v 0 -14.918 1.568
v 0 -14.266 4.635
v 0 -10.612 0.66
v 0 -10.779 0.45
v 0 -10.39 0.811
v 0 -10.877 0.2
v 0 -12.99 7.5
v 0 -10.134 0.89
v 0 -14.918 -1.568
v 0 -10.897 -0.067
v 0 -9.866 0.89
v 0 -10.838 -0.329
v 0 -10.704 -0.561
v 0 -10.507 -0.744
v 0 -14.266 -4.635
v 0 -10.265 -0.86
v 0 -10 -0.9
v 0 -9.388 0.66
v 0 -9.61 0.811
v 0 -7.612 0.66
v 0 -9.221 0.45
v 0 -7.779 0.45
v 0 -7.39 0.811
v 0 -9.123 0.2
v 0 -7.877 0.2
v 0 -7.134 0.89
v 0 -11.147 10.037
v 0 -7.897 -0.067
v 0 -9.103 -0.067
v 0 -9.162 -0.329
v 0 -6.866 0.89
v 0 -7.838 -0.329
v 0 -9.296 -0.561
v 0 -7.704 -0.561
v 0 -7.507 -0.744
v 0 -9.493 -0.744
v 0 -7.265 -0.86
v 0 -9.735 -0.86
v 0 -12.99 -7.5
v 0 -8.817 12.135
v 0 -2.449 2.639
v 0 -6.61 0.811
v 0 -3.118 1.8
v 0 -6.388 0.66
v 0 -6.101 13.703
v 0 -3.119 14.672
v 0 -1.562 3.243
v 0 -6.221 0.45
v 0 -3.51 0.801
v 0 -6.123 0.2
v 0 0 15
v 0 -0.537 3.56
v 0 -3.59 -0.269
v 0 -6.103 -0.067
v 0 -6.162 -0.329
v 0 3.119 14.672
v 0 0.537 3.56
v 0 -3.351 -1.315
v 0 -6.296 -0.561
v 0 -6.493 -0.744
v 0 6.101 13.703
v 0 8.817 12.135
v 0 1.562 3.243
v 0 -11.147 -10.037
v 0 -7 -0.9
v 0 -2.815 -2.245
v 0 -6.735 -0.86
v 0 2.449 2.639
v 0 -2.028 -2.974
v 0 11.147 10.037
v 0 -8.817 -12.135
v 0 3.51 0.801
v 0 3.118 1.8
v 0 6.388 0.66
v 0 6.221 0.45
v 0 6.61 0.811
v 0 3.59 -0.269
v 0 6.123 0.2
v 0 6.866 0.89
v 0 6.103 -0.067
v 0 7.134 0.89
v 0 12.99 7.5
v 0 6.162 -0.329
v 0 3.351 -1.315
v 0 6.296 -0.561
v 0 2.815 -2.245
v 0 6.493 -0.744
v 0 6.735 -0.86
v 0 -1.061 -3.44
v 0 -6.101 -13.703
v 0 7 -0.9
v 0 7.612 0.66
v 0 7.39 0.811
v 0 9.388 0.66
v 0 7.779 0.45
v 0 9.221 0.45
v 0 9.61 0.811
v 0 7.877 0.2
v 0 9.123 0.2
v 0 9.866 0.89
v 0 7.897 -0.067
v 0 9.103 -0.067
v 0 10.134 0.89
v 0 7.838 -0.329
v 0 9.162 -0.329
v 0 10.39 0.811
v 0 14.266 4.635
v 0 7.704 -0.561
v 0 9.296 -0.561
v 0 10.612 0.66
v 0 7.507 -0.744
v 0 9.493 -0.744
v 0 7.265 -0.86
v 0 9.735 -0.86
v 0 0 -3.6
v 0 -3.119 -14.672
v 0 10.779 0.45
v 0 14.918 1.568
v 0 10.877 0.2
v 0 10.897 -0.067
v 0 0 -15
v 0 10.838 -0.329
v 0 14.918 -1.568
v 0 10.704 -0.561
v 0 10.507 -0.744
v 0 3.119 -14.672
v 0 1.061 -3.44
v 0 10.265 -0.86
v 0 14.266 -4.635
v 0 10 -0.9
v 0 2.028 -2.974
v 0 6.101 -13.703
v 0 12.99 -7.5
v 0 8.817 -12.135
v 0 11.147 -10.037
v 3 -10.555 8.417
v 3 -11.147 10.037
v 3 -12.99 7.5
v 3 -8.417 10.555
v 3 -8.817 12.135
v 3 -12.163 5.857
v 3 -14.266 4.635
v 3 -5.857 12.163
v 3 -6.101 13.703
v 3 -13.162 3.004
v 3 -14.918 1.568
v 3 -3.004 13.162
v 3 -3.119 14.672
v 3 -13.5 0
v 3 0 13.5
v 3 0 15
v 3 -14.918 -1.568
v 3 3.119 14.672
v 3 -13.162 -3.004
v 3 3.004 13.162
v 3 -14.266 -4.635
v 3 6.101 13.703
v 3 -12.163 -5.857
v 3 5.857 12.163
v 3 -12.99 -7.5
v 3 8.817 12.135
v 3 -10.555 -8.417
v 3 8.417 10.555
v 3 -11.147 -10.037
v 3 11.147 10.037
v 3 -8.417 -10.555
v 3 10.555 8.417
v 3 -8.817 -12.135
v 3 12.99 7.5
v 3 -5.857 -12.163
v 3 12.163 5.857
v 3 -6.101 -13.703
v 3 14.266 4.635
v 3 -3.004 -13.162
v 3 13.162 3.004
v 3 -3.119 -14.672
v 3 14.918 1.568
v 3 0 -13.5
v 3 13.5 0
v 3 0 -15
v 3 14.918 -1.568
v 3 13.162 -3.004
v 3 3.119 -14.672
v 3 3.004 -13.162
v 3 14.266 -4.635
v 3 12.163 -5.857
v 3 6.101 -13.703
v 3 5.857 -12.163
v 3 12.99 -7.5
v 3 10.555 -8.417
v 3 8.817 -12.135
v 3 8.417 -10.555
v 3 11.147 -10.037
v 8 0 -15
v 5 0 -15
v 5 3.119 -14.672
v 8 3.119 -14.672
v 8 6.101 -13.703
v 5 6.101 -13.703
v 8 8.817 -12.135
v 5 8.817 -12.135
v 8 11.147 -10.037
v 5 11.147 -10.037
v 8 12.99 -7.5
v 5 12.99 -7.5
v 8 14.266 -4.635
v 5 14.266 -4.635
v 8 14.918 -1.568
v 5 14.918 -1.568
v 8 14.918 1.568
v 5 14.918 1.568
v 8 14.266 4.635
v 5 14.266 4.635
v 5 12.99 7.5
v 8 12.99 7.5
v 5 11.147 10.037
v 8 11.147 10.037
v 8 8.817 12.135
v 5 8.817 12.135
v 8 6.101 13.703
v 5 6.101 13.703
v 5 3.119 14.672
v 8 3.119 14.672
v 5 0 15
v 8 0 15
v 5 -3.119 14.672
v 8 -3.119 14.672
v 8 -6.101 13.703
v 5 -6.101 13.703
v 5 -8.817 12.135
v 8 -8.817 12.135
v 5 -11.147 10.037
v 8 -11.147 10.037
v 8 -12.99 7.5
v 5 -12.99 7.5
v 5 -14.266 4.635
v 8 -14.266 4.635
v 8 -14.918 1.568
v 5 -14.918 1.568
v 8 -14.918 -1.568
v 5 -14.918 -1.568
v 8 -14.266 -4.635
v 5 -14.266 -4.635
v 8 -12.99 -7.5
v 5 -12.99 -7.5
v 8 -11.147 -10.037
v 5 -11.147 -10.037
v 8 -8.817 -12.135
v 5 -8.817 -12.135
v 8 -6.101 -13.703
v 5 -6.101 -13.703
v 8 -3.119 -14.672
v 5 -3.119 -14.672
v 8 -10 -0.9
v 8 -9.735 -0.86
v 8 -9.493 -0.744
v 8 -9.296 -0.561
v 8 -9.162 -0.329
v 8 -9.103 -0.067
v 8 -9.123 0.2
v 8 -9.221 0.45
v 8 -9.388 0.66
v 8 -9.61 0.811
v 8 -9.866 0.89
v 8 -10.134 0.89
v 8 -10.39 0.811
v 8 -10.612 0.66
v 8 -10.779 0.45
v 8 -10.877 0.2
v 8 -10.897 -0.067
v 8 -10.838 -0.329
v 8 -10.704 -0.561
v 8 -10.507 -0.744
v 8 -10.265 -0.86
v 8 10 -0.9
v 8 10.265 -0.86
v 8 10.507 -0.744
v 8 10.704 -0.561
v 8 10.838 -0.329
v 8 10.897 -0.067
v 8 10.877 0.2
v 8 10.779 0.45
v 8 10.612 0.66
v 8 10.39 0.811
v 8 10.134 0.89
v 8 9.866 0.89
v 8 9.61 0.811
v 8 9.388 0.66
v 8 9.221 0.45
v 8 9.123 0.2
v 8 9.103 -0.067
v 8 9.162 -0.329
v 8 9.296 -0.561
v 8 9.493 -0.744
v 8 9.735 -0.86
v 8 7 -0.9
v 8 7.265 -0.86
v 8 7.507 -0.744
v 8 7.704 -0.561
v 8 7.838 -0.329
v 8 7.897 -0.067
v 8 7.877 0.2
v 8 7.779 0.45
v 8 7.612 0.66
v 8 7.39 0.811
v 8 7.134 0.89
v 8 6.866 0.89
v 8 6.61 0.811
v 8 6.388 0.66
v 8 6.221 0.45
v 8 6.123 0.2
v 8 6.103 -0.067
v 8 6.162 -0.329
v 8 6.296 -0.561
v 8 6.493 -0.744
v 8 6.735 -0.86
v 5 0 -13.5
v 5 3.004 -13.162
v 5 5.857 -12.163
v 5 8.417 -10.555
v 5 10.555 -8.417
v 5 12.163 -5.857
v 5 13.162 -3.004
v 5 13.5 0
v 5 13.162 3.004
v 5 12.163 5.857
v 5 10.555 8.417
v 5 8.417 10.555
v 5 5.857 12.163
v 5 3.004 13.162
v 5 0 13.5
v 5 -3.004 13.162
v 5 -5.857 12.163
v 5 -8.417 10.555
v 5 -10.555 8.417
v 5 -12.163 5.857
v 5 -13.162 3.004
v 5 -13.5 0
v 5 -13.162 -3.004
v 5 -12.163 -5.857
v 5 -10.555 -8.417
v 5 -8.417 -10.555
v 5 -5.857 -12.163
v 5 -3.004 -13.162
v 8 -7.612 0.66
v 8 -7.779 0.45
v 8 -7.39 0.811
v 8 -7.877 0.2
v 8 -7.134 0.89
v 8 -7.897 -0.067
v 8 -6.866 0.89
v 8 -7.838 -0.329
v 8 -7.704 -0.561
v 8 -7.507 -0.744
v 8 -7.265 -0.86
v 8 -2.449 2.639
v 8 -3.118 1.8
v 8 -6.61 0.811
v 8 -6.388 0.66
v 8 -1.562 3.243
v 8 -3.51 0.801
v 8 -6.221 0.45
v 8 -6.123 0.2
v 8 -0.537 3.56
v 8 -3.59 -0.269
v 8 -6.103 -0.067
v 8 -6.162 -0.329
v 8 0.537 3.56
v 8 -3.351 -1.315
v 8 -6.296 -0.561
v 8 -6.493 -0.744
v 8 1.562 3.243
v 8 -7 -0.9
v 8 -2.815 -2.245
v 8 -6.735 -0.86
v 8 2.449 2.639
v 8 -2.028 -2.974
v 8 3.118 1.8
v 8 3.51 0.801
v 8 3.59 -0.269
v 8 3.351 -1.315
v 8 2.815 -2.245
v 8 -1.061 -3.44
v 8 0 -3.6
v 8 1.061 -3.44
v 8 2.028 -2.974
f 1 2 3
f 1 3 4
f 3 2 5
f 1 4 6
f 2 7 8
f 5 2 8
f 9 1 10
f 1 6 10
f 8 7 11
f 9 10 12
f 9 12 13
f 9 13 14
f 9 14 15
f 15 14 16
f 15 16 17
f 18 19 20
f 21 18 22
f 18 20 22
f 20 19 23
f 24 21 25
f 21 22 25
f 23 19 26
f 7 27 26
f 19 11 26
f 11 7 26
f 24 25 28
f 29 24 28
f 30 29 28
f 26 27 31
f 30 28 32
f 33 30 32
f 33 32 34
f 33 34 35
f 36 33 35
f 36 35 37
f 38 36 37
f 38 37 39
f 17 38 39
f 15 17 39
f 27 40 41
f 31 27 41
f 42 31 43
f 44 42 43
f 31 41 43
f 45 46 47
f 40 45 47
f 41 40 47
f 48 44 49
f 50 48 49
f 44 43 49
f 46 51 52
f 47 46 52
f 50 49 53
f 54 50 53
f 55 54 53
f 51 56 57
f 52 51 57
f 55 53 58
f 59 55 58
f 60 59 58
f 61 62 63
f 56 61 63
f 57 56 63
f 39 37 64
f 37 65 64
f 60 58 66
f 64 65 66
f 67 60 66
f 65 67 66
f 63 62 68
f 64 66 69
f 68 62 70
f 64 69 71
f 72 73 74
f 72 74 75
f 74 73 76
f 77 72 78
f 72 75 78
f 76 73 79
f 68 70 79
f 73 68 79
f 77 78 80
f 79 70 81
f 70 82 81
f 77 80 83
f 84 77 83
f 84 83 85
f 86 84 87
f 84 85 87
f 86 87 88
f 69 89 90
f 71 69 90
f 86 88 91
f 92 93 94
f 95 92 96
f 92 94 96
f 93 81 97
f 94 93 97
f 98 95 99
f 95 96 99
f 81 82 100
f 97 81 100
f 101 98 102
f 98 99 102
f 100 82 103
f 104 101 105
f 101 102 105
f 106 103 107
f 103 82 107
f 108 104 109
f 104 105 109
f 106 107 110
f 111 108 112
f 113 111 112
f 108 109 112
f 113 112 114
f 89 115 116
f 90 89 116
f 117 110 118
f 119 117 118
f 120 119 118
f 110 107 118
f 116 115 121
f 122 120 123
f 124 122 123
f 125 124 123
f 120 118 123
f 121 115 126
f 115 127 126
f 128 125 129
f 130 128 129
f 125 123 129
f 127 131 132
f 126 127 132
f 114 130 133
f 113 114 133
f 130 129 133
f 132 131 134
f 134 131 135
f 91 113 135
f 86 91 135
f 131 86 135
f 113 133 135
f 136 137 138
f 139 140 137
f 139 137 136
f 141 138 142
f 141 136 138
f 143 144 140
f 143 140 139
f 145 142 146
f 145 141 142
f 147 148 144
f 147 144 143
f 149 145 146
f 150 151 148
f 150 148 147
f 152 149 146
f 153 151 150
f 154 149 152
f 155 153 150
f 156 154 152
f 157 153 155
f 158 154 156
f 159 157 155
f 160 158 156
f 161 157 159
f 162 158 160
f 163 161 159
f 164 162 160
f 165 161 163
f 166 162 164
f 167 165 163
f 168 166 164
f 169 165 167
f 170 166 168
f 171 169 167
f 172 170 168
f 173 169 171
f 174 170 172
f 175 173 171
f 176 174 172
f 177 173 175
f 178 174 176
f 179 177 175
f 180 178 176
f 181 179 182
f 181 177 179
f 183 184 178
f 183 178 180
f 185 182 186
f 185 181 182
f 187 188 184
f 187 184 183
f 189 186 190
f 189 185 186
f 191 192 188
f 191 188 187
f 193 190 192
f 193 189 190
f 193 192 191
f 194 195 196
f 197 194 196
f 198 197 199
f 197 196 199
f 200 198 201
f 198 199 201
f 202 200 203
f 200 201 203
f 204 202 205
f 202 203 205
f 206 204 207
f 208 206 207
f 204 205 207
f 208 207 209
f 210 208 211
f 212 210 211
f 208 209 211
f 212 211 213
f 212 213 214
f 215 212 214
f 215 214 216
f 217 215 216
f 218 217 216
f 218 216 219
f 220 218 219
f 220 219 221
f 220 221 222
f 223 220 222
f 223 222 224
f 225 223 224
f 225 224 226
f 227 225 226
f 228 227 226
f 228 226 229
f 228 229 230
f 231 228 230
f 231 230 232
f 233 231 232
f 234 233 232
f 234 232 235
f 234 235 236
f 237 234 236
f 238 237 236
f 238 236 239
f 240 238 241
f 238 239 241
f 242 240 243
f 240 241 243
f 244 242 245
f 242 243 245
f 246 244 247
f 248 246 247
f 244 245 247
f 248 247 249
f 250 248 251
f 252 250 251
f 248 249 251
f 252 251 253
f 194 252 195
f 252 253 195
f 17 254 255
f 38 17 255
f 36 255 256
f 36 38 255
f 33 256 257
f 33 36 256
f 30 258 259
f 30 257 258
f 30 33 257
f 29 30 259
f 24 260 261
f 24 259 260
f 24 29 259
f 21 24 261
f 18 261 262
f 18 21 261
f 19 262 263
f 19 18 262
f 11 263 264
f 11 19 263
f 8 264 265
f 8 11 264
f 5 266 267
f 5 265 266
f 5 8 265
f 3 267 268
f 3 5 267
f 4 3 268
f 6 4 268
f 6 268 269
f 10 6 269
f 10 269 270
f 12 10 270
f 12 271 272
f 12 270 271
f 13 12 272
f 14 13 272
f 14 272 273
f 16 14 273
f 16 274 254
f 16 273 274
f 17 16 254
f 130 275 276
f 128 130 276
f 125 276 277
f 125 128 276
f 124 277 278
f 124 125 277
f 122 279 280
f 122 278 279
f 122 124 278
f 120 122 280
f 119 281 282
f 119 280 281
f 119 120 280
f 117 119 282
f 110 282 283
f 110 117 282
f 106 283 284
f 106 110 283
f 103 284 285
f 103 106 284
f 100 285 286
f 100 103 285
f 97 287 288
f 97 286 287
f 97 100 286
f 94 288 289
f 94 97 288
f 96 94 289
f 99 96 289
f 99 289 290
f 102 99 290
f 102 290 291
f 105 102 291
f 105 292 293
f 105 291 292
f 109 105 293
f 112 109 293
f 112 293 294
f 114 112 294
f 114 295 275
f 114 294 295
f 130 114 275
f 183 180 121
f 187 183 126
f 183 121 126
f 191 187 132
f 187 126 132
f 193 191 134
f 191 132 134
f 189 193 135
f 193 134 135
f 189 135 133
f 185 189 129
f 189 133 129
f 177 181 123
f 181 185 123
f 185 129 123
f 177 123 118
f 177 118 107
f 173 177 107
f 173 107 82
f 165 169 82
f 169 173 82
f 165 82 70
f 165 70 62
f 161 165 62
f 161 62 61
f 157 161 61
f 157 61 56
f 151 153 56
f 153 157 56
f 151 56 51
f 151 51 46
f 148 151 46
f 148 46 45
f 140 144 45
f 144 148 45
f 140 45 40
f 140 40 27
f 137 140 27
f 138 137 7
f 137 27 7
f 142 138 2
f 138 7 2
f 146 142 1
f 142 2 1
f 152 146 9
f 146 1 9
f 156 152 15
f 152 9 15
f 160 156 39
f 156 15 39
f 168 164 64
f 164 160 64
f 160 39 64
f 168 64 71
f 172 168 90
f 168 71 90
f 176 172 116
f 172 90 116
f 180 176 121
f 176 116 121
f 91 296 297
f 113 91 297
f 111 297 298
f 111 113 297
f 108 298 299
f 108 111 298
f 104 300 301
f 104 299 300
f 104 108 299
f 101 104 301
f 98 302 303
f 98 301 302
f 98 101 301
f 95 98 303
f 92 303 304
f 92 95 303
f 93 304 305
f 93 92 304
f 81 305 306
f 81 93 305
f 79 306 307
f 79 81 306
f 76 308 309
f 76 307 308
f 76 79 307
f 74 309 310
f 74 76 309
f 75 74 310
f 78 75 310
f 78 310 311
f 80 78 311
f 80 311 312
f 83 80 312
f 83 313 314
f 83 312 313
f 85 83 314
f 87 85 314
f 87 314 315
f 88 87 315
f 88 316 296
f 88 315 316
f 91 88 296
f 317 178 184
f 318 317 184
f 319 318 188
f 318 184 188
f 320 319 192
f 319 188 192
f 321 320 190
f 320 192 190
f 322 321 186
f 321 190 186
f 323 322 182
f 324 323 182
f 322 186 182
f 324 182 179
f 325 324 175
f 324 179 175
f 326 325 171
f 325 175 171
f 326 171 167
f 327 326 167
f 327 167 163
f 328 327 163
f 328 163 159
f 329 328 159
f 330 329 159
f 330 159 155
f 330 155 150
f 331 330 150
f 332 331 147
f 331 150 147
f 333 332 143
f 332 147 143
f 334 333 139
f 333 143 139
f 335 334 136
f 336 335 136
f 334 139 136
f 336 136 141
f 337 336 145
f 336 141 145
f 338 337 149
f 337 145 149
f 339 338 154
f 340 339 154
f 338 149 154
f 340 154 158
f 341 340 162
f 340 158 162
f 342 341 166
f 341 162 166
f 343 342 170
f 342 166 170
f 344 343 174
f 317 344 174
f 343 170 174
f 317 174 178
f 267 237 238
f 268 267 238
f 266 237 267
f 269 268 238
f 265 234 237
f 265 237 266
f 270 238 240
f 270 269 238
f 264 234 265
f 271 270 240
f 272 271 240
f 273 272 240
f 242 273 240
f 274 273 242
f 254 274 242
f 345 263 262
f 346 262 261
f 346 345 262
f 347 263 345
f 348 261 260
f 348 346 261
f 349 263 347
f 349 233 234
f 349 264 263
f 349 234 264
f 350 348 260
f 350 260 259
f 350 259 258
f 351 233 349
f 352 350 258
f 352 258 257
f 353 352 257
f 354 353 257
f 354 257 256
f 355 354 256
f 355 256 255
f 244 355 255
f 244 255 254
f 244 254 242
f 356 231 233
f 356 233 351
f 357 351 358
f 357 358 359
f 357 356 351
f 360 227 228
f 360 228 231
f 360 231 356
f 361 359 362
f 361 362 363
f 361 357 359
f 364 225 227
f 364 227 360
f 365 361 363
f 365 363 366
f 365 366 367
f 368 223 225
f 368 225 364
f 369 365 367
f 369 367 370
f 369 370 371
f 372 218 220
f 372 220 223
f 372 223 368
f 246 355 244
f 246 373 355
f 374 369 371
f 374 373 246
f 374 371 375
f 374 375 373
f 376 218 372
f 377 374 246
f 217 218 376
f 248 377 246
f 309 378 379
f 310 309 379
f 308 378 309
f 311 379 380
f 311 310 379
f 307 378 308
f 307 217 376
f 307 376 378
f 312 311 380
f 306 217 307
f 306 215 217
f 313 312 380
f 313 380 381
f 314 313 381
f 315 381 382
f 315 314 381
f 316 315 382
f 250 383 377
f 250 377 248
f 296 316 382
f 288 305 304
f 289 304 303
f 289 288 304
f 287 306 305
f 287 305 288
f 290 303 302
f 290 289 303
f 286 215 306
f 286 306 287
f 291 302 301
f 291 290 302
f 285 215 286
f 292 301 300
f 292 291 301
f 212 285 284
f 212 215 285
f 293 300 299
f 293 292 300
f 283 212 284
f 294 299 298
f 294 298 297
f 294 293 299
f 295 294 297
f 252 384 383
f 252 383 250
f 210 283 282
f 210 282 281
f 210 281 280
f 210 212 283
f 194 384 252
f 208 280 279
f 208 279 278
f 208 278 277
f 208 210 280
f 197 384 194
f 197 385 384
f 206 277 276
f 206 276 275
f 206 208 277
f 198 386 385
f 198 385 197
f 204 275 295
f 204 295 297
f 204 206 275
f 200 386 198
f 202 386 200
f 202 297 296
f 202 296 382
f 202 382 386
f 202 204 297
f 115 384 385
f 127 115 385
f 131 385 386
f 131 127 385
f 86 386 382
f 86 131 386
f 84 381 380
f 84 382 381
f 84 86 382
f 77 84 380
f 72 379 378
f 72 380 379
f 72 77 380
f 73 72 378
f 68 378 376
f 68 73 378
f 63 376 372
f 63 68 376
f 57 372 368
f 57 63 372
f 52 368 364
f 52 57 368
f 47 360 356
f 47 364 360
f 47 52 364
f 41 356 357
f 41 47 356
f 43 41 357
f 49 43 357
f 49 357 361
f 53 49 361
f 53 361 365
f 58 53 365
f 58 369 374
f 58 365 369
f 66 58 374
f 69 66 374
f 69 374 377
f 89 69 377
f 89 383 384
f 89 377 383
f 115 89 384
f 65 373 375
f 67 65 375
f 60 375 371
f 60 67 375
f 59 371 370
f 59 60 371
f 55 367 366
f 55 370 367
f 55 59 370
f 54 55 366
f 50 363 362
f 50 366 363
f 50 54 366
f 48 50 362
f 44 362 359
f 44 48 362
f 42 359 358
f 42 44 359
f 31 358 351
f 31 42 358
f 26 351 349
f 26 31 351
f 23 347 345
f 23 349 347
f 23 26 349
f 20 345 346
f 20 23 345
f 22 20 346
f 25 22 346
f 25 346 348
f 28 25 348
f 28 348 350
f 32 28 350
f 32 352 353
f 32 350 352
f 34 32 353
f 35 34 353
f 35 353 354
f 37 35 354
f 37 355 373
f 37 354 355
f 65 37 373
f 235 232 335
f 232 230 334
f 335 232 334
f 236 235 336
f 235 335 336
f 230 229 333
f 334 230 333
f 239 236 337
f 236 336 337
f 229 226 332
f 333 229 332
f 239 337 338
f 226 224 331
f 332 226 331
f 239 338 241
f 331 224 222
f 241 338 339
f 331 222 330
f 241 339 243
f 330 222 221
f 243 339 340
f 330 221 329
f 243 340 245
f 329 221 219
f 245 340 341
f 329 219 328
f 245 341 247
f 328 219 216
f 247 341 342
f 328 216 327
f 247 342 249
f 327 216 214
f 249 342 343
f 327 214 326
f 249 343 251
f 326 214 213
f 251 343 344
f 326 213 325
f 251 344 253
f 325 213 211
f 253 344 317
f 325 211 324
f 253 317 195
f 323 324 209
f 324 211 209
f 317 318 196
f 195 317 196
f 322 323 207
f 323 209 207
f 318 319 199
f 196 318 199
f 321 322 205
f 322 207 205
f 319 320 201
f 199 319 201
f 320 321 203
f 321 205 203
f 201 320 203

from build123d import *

# Parameters (mm, degrees)
SKETCH1_R           = 15
BOSS_EXTRUDE1_DEPTH = 8
BOSS_EXTRUDE2_START = 3
SKETCH2_R           = 16
BOSS_EXTRUDE2_DEPTH = 2
BOSS_EXTRUDE3_START = 3
SKETCH3_R           = 13.5
BOSS_EXTRUDE3_DEPTH = 2
BOSS_EXTRUDE4_START = -1
SKETCH4_R           = 3.6
BOSS_EXTRUDE4_DEPTH = 10
BOSS_EXTRUDE5_START = -1
SKETCH5_R           = 0.9
BOSS_EXTRUDE5_DEPTH = 10
BOSS_EXTRUDE6_START = -1
SKETCH6_R           = 0.9
BOSS_EXTRUDE6_DEPTH = 10
BOSS_EXTRUDE7_START = -1
SKETCH7_R           = 0.9
BOSS_EXTRUDE7_DEPTH = 10
BOSS_EXTRUDE8_START = -1
SKETCH8_R           = 0.9
BOSS_EXTRUDE8_DEPTH = 10


with BuildPart() as part:
    # Sketch1 → Boss-Extrude1 (new body)
    with BuildSketch(Plane(origin=(0, 0, 0), x_dir=(0, 0, -1), z_dir=(1, 0, 0))):
        Circle(SKETCH1_R)
    extrude(amount=BOSS_EXTRUDE1_DEPTH)


with BuildPart() as body_2:
    # Sketch2 → Boss-Extrude2 (new body)
    with BuildSketch(Plane(origin=(0, 0, 0), x_dir=(0, 0, -1), z_dir=(1, 0, 0)).offset(BOSS_EXTRUDE2_START)):
        Circle(SKETCH2_R)
    extrude(amount=BOSS_EXTRUDE2_DEPTH)


with BuildPart() as part_1:
    add(part.part)

    # Combine1: cut body 2
    add(body_2.part, mode=Mode.SUBTRACT)

    # Sketch3 → Boss-Extrude3 (add)
    with BuildSketch(Plane(origin=(0, 0, 0), x_dir=(0, 0, -1), z_dir=(1, 0, 0)).offset(BOSS_EXTRUDE3_START)):
        Circle(SKETCH3_R)
    extrude(amount=BOSS_EXTRUDE3_DEPTH)


with BuildPart() as body_2_2:
    # Sketch4 → Boss-Extrude4 (new body)
    with BuildSketch(Plane(origin=(0, 0, 0), x_dir=(0, 0, -1), z_dir=(1, 0, 0)).offset(BOSS_EXTRUDE4_START)):
        Circle(SKETCH4_R)
    extrude(amount=BOSS_EXTRUDE4_DEPTH)


with BuildPart() as part_2:
    add(part_1.part)

    # Combine2: cut body 2 2
    add(body_2_2.part, mode=Mode.SUBTRACT)


with BuildPart() as body_2_3:
    # Sketch5 → Boss-Extrude5 (new body)
    with BuildSketch(Plane(origin=(0, 0, 0), x_dir=(0, 0, -1), z_dir=(1, 0, 0)).offset(BOSS_EXTRUDE5_START)):
        with Locations((0, -10)):
            Circle(SKETCH5_R)
    extrude(amount=BOSS_EXTRUDE5_DEPTH)


with BuildPart() as part_3:
    add(part_2.part)

    # Combine3: cut body 2 3
    add(body_2_3.part, mode=Mode.SUBTRACT)


with BuildPart() as body_2_4:
    # Sketch6 → Boss-Extrude6 (new body)
    with BuildSketch(Plane(origin=(0, 0, 0), x_dir=(0, 0, -1), z_dir=(1, 0, 0)).offset(BOSS_EXTRUDE6_START)):
        with Locations((0, -7)):
            Circle(SKETCH6_R)
    extrude(amount=BOSS_EXTRUDE6_DEPTH)


with BuildPart() as part_4:
    add(part_3.part)

    # Combine4: cut body 2 4
    add(body_2_4.part, mode=Mode.SUBTRACT)


with BuildPart() as body_2_5:
    # Sketch7 → Boss-Extrude7 (new body)
    with BuildSketch(Plane(origin=(0, 0, 0), x_dir=(0, 0, -1), z_dir=(1, 0, 0)).offset(BOSS_EXTRUDE7_START)):
        with Locations((0, 7)):
            Circle(SKETCH7_R)
    extrude(amount=BOSS_EXTRUDE7_DEPTH)


with BuildPart() as part_5:
    add(part_4.part)

    # Combine5: cut body 2 5
    add(body_2_5.part, mode=Mode.SUBTRACT)


with BuildPart() as body_2_6:
    # Sketch8 → Boss-Extrude8 (new body)
    with BuildSketch(Plane(origin=(0, 0, 0), x_dir=(0, 0, -1), z_dir=(1, 0, 0)).offset(BOSS_EXTRUDE8_START)):
        with Locations((0, 10)):
            Circle(SKETCH8_R)
    extrude(amount=BOSS_EXTRUDE8_DEPTH)


with BuildPart() as part_6:
    add(part_5.part)

    # Combine6: cut body 2 6
    add(body_2_6.part, mode=Mode.SUBTRACT)


solid = part_6.part
